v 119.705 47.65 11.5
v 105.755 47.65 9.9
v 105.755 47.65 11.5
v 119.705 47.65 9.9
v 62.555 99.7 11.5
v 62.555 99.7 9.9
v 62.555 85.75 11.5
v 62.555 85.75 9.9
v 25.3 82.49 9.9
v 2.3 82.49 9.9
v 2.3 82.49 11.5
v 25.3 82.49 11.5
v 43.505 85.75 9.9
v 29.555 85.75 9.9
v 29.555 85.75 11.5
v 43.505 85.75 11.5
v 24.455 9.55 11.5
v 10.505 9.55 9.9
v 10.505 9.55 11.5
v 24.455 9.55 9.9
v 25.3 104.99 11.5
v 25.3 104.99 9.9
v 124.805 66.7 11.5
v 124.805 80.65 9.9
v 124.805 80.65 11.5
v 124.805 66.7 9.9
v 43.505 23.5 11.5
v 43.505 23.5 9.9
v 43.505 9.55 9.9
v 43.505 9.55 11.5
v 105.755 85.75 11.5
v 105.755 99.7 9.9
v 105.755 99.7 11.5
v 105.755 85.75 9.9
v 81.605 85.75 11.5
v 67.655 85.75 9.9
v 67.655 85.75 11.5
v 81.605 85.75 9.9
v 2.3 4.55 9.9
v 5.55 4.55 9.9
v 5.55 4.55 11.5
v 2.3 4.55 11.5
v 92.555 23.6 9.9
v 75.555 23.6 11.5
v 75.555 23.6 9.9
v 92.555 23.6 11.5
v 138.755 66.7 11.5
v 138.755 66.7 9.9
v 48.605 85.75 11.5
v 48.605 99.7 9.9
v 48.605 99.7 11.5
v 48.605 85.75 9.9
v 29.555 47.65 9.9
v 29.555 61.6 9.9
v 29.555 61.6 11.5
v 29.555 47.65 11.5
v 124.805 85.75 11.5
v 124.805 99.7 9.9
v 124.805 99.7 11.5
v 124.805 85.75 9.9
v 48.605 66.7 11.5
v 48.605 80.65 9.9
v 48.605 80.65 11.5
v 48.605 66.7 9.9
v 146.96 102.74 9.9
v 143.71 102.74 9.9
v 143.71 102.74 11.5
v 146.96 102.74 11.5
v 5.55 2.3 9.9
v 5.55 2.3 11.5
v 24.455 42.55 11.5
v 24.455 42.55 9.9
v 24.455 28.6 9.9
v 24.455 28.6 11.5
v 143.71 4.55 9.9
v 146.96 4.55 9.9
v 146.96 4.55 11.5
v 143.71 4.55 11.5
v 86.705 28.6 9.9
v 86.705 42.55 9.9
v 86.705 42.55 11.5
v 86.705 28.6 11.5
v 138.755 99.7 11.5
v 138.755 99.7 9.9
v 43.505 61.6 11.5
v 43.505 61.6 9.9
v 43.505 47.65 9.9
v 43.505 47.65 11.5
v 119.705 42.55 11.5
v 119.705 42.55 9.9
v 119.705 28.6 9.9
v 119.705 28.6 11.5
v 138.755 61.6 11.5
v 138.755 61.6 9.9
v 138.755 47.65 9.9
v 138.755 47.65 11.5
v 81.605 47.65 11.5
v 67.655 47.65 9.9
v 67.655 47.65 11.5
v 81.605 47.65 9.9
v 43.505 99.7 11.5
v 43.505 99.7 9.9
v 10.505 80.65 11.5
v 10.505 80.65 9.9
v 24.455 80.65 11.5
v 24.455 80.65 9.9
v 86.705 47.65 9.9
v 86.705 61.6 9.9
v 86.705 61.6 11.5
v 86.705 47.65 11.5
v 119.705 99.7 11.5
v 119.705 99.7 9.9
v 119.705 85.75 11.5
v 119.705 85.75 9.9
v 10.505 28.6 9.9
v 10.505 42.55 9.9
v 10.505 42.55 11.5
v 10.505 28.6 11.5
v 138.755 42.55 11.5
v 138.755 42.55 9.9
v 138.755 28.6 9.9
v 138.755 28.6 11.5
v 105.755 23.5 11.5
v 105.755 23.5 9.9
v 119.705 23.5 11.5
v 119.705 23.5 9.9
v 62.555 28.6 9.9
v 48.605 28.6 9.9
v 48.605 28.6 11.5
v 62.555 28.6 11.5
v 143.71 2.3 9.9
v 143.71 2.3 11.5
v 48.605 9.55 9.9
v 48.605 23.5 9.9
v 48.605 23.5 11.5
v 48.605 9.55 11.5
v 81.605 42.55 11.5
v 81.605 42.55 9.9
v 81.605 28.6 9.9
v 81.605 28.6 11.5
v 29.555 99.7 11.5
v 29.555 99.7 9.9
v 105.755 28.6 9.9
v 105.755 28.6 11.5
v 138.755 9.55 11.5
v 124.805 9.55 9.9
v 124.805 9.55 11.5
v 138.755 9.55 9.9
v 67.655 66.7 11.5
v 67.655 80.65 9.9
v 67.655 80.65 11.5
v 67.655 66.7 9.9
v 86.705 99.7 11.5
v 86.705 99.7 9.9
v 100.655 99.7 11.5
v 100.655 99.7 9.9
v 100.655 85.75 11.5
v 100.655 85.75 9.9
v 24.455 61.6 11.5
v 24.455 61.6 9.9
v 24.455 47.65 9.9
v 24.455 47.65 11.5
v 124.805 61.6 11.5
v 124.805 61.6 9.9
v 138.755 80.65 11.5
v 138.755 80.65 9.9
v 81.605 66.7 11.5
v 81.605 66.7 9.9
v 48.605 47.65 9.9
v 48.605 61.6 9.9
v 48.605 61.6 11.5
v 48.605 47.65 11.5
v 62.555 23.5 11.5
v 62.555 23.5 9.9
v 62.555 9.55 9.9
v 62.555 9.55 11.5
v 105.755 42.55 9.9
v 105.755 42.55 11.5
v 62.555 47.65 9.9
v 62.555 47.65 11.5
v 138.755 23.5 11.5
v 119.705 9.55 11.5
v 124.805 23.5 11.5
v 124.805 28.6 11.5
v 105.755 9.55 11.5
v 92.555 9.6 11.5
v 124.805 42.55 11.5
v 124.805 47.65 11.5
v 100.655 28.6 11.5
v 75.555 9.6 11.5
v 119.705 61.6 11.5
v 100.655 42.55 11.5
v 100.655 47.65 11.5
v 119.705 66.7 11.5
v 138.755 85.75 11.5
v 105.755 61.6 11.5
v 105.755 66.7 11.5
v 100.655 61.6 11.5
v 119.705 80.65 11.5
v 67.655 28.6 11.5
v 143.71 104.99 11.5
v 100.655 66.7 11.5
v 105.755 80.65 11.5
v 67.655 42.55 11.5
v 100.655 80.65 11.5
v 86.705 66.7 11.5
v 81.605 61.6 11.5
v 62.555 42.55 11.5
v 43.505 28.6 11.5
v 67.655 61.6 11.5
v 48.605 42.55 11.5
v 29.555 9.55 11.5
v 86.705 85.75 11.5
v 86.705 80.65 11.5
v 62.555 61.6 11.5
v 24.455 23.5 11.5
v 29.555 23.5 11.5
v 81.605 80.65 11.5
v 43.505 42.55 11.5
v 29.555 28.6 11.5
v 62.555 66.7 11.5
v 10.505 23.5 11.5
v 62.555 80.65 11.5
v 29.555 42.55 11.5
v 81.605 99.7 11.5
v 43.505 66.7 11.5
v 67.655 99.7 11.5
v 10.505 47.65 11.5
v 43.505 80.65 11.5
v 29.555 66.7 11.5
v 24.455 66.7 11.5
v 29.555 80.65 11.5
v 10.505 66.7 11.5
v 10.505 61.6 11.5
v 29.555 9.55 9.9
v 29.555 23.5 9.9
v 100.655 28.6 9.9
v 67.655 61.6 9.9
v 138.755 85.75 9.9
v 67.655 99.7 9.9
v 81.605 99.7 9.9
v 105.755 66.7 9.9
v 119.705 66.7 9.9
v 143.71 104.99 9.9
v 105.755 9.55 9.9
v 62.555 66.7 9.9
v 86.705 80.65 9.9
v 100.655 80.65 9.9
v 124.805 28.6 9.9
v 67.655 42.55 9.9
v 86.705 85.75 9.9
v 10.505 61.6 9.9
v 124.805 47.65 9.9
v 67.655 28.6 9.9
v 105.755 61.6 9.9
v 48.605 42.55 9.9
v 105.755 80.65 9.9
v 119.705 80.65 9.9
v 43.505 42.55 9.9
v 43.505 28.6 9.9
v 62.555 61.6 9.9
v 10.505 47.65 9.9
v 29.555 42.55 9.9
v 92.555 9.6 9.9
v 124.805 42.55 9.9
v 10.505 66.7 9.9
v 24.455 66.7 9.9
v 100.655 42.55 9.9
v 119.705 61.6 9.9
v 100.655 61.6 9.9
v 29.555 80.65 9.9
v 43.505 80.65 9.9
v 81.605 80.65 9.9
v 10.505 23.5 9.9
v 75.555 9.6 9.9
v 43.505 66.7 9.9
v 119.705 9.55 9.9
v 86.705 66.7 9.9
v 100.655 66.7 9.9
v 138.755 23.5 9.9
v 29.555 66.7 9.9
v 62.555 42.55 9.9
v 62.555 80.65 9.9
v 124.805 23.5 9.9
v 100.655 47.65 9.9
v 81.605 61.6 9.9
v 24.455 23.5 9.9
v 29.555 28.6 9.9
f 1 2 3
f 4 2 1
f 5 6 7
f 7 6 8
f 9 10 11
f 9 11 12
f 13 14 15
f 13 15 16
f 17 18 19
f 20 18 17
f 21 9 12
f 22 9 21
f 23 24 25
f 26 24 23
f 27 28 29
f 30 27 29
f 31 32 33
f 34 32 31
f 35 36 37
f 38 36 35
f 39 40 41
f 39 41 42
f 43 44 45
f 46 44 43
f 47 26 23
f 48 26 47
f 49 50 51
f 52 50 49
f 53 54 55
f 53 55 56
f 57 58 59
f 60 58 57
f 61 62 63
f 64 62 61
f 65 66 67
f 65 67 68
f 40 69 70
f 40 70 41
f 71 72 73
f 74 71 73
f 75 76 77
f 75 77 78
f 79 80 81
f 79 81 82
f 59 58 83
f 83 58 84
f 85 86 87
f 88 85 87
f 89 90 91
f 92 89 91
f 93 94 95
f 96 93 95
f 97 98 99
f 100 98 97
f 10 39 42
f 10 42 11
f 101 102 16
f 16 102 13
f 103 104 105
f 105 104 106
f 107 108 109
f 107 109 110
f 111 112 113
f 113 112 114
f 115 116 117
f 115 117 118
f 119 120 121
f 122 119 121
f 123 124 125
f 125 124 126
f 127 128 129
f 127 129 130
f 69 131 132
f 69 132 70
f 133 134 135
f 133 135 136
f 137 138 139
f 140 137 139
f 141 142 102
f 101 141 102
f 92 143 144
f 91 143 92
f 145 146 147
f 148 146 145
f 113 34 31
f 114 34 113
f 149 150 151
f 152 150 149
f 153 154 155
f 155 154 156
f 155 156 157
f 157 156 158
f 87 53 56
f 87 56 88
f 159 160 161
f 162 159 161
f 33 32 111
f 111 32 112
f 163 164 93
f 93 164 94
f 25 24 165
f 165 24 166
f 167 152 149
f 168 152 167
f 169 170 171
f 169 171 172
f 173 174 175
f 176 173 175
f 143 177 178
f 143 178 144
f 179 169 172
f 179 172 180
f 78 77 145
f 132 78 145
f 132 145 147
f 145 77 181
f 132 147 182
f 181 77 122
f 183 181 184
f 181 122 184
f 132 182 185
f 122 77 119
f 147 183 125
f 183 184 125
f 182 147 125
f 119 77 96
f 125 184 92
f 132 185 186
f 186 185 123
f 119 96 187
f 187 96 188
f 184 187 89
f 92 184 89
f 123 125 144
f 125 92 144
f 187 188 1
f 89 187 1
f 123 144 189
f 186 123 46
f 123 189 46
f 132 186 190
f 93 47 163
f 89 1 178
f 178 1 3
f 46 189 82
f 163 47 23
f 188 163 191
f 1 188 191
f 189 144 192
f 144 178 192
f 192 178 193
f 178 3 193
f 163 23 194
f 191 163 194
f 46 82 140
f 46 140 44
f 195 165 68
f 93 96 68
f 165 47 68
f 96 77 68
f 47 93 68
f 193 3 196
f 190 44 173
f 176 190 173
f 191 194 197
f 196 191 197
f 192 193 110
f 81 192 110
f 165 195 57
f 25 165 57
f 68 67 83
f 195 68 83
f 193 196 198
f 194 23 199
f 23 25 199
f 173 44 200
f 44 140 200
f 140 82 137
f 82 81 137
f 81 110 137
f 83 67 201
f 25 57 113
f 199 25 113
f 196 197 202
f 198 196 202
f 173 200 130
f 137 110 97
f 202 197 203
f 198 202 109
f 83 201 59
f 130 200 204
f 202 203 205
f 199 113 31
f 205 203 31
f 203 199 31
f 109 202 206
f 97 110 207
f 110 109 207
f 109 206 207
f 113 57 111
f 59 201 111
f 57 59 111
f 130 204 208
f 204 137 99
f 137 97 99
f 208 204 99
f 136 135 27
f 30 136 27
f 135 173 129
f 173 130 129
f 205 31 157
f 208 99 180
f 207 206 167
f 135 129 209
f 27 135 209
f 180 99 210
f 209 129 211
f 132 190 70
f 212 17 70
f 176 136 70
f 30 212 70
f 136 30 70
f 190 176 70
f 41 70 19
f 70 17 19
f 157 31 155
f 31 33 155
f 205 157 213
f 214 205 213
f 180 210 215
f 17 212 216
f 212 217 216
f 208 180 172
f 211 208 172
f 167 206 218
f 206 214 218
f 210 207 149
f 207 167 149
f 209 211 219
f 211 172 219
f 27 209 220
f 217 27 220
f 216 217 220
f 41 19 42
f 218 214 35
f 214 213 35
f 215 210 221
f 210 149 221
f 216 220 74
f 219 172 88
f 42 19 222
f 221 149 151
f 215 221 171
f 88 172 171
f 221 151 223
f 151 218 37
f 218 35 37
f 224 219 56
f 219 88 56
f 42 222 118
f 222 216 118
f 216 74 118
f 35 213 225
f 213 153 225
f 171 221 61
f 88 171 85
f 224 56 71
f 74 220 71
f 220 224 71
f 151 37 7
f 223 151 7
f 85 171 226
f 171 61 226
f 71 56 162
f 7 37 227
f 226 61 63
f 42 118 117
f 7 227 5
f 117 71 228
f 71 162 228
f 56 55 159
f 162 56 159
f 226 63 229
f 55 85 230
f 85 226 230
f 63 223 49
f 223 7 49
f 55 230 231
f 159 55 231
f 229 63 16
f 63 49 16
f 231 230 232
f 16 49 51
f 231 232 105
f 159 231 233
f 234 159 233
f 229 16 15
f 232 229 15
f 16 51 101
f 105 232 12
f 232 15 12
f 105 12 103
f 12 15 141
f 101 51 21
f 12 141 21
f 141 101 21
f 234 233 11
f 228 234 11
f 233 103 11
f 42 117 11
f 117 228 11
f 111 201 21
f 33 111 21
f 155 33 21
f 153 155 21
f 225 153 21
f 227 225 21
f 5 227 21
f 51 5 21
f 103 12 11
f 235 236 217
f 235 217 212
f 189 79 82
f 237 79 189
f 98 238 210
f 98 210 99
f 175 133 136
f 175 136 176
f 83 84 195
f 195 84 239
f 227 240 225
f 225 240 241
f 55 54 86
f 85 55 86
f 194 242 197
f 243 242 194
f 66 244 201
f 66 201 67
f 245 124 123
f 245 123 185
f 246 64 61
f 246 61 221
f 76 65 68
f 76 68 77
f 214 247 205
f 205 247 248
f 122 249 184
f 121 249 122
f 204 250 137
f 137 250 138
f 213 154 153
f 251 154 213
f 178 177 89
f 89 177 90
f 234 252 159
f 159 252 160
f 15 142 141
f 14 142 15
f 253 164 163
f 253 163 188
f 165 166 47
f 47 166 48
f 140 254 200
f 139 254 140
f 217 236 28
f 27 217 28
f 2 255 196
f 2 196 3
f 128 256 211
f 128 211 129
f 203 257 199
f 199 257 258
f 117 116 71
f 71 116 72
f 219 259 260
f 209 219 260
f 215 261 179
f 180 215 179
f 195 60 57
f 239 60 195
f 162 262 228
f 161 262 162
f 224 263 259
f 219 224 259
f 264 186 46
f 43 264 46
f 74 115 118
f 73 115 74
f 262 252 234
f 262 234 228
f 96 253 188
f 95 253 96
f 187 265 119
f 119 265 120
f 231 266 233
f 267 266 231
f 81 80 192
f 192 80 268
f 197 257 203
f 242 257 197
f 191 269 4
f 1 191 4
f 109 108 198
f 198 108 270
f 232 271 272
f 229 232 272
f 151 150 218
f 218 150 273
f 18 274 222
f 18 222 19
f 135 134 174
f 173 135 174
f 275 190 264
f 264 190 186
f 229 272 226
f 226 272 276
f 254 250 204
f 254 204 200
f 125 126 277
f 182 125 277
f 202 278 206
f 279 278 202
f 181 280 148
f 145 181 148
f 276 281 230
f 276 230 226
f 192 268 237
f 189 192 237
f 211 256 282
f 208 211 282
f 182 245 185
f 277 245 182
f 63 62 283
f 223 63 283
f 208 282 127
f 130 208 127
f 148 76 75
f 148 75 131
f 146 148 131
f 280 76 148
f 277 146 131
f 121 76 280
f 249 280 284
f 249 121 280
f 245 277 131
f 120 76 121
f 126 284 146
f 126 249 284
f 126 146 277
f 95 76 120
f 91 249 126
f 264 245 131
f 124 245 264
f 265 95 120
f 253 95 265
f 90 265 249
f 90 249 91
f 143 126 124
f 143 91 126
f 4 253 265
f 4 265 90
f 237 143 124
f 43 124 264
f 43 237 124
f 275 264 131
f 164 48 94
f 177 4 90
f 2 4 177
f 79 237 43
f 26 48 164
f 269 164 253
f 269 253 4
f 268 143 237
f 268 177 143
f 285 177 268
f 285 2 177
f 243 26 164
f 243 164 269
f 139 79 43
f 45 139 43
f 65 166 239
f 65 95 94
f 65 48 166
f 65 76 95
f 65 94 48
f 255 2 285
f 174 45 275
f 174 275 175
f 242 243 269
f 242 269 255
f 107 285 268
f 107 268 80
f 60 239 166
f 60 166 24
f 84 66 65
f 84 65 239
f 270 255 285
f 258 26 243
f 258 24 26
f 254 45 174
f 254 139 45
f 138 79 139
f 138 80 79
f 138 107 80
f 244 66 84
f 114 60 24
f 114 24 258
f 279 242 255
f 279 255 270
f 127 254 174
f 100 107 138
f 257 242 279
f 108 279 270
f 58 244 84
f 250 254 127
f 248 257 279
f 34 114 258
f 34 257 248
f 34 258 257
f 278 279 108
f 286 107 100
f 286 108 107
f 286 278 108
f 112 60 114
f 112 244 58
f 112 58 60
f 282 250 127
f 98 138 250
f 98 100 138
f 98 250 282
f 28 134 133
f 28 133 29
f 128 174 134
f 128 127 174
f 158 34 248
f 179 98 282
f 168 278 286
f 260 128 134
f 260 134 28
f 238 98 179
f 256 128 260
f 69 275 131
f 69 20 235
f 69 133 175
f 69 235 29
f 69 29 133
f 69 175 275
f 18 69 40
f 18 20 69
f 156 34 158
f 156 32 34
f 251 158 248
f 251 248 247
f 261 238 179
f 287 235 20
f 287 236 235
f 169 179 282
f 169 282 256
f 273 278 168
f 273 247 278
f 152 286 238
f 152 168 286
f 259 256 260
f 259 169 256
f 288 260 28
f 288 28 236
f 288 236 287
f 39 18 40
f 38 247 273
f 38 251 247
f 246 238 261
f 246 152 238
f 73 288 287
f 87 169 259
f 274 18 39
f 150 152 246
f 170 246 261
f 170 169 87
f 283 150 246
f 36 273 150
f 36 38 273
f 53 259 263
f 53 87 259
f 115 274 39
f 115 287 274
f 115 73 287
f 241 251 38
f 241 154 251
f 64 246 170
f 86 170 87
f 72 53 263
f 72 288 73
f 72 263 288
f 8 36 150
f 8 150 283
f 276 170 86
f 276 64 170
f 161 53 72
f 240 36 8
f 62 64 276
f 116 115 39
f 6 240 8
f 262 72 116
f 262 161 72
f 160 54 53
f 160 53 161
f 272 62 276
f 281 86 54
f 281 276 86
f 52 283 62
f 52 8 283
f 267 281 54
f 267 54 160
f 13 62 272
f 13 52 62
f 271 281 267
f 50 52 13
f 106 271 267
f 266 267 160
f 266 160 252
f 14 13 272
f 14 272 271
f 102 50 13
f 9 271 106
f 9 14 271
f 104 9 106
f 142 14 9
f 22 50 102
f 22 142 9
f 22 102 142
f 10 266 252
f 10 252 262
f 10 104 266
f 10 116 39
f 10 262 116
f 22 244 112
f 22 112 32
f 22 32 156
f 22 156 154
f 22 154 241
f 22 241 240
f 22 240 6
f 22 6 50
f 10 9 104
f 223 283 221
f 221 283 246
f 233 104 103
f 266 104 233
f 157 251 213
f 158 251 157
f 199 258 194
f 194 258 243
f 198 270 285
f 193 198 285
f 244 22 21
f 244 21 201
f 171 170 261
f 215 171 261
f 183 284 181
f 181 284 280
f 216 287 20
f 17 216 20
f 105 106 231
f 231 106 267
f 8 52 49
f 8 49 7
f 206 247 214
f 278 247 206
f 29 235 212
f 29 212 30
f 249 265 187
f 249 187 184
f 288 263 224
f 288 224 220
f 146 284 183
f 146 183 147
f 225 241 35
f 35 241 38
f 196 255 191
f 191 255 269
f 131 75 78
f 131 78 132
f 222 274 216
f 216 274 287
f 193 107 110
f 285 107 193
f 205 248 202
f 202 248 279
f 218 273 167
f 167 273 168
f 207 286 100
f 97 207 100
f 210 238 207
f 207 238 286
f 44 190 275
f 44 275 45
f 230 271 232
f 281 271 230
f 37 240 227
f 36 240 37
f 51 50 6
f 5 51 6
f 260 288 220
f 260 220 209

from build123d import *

# Parameters (mm, degrees)
PAD004_DEPTH    = 1.6
SKETCH010_W     = 13.95
SKETCH010_H     = 13.95
POCKET004_DEPTH = 1.6
SKETCH013_W     = 17
SKETCH013_H     = 14
POCKET005_DEPTH = 1.6


with BuildPart() as part:
    # Sketch008 → Pad004 (new body)
    with BuildSketch(Plane.XY.offset(9.9)):
        Polygon((25.3, 104.99), (143.71, 104.99), (143.71, 102.74), (146.96, 102.74), (146.96, 4.55), (143.71, 4.55), (143.71, 2.3), (5.55, 2.3), (5.55, 4.55), (2.3, 4.55), (2.3, 82.49), (25.3, 82.49), align=None)
    extrude(amount=PAD004_DEPTH)

    # Sketch010 (on Face13 of Pad004) → Pocket004 (cut)
    with BuildSketch(Plane(origin=(0, 0, 9.9), x_dir=(1, 0, 0), z_dir=(0, 0, -1))):
        with Locations((131.78, -16.525)):
            Rectangle(SKETCH010_W, SKETCH010_H)
        with Locations((55.58, -16.525)):
            Rectangle(SKETCH010_W, SKETCH010_H)
        with Locations((36.53, -16.525)):
            Rectangle(SKETCH010_W, SKETCH010_H)
        with Locations((17.48, -16.525)):
            Rectangle(SKETCH010_W, SKETCH010_H)
        with Locations((131.78, -35.575)):
            Rectangle(SKETCH010_W, SKETCH010_H)
        with Locations((112.73, -35.575)):
            Rectangle(SKETCH010_W, SKETCH010_H)
        with Locations((93.68, -35.575)):
            Rectangle(SKETCH010_W, SKETCH010_H)
        with Locations((74.63, -35.575)):
            Rectangle(SKETCH010_W, SKETCH010_H)
        with Locations((55.58, -35.575)):
            Rectangle(SKETCH010_W, SKETCH010_H)
        with Locations((36.53, -35.575)):
            Rectangle(SKETCH010_W, SKETCH010_H)
        with Locations((17.48, -35.575)):
            Rectangle(SKETCH010_W, SKETCH010_H)
        with Locations((131.78, -54.625)):
            Rectangle(SKETCH010_W, SKETCH010_H)
        with Locations((112.73, -54.625)):
            Rectangle(SKETCH010_W, SKETCH010_H)
        with Locations((93.68, -54.625)):
            Rectangle(SKETCH010_W, SKETCH010_H)
        with Locations((74.63, -54.625)):
            Rectangle(SKETCH010_W, SKETCH010_H)
        with Locations((55.58, -54.625)):
            Rectangle(SKETCH010_W, SKETCH010_H)
        with Locations((36.53, -54.625)):
            Rectangle(SKETCH010_W, SKETCH010_H)
        with Locations((17.48, -54.625)):
            Rectangle(SKETCH010_W, SKETCH010_H)
        with Locations((131.78, -73.675)):
            Rectangle(SKETCH010_W, SKETCH010_H)
        with Locations((112.73, -73.675)):
            Rectangle(SKETCH010_W, SKETCH010_H)
        with Locations((93.68, -73.675)):
            Rectangle(SKETCH010_W, SKETCH010_H)
        with Locations((74.63, -73.675)):
            Rectangle(SKETCH010_W, SKETCH010_H)
        with Locations((55.58, -73.675)):
            Rectangle(SKETCH010_W, SKETCH010_H)
        with Locations((36.53, -73.675)):
            Rectangle(SKETCH010_W, SKETCH010_H)
        with Locations((17.48, -73.675)):
            Rectangle(SKETCH010_W, SKETCH010_H)
        with Locations((131.78, -92.725)):
            Rectangle(SKETCH010_W, SKETCH010_H)
        with Locations((112.73, -92.725)):
            Rectangle(SKETCH010_W, SKETCH010_H)
        with Locations((93.68, -92.725)):
            Rectangle(SKETCH010_W, SKETCH010_H)
        with Locations((74.63, -92.725)):
            Rectangle(SKETCH010_W, SKETCH010_H)
        with Locations((55.58, -92.725)):
            Rectangle(SKETCH010_W, SKETCH010_H)
        with Locations((36.53, -92.725)):
            Rectangle(SKETCH010_W, SKETCH010_H)
        with Locations((112.73, -16.525)):
            Rectangle(SKETCH010_W, SKETCH010_H)
    extrude(amount=-POCKET004_DEPTH, mode=Mode.SUBTRACT)

    # Sketch013 (on Face5 of Pocket004) → Pocket005 (cut)
    with BuildSketch(Plane.XY.offset(11.5)):
        with Locations((84.055, 16.6)):
            Rectangle(SKETCH013_W, SKETCH013_H)
    extrude(amount=-POCKET005_DEPTH, mode=Mode.SUBTRACT)


solid = part.part
